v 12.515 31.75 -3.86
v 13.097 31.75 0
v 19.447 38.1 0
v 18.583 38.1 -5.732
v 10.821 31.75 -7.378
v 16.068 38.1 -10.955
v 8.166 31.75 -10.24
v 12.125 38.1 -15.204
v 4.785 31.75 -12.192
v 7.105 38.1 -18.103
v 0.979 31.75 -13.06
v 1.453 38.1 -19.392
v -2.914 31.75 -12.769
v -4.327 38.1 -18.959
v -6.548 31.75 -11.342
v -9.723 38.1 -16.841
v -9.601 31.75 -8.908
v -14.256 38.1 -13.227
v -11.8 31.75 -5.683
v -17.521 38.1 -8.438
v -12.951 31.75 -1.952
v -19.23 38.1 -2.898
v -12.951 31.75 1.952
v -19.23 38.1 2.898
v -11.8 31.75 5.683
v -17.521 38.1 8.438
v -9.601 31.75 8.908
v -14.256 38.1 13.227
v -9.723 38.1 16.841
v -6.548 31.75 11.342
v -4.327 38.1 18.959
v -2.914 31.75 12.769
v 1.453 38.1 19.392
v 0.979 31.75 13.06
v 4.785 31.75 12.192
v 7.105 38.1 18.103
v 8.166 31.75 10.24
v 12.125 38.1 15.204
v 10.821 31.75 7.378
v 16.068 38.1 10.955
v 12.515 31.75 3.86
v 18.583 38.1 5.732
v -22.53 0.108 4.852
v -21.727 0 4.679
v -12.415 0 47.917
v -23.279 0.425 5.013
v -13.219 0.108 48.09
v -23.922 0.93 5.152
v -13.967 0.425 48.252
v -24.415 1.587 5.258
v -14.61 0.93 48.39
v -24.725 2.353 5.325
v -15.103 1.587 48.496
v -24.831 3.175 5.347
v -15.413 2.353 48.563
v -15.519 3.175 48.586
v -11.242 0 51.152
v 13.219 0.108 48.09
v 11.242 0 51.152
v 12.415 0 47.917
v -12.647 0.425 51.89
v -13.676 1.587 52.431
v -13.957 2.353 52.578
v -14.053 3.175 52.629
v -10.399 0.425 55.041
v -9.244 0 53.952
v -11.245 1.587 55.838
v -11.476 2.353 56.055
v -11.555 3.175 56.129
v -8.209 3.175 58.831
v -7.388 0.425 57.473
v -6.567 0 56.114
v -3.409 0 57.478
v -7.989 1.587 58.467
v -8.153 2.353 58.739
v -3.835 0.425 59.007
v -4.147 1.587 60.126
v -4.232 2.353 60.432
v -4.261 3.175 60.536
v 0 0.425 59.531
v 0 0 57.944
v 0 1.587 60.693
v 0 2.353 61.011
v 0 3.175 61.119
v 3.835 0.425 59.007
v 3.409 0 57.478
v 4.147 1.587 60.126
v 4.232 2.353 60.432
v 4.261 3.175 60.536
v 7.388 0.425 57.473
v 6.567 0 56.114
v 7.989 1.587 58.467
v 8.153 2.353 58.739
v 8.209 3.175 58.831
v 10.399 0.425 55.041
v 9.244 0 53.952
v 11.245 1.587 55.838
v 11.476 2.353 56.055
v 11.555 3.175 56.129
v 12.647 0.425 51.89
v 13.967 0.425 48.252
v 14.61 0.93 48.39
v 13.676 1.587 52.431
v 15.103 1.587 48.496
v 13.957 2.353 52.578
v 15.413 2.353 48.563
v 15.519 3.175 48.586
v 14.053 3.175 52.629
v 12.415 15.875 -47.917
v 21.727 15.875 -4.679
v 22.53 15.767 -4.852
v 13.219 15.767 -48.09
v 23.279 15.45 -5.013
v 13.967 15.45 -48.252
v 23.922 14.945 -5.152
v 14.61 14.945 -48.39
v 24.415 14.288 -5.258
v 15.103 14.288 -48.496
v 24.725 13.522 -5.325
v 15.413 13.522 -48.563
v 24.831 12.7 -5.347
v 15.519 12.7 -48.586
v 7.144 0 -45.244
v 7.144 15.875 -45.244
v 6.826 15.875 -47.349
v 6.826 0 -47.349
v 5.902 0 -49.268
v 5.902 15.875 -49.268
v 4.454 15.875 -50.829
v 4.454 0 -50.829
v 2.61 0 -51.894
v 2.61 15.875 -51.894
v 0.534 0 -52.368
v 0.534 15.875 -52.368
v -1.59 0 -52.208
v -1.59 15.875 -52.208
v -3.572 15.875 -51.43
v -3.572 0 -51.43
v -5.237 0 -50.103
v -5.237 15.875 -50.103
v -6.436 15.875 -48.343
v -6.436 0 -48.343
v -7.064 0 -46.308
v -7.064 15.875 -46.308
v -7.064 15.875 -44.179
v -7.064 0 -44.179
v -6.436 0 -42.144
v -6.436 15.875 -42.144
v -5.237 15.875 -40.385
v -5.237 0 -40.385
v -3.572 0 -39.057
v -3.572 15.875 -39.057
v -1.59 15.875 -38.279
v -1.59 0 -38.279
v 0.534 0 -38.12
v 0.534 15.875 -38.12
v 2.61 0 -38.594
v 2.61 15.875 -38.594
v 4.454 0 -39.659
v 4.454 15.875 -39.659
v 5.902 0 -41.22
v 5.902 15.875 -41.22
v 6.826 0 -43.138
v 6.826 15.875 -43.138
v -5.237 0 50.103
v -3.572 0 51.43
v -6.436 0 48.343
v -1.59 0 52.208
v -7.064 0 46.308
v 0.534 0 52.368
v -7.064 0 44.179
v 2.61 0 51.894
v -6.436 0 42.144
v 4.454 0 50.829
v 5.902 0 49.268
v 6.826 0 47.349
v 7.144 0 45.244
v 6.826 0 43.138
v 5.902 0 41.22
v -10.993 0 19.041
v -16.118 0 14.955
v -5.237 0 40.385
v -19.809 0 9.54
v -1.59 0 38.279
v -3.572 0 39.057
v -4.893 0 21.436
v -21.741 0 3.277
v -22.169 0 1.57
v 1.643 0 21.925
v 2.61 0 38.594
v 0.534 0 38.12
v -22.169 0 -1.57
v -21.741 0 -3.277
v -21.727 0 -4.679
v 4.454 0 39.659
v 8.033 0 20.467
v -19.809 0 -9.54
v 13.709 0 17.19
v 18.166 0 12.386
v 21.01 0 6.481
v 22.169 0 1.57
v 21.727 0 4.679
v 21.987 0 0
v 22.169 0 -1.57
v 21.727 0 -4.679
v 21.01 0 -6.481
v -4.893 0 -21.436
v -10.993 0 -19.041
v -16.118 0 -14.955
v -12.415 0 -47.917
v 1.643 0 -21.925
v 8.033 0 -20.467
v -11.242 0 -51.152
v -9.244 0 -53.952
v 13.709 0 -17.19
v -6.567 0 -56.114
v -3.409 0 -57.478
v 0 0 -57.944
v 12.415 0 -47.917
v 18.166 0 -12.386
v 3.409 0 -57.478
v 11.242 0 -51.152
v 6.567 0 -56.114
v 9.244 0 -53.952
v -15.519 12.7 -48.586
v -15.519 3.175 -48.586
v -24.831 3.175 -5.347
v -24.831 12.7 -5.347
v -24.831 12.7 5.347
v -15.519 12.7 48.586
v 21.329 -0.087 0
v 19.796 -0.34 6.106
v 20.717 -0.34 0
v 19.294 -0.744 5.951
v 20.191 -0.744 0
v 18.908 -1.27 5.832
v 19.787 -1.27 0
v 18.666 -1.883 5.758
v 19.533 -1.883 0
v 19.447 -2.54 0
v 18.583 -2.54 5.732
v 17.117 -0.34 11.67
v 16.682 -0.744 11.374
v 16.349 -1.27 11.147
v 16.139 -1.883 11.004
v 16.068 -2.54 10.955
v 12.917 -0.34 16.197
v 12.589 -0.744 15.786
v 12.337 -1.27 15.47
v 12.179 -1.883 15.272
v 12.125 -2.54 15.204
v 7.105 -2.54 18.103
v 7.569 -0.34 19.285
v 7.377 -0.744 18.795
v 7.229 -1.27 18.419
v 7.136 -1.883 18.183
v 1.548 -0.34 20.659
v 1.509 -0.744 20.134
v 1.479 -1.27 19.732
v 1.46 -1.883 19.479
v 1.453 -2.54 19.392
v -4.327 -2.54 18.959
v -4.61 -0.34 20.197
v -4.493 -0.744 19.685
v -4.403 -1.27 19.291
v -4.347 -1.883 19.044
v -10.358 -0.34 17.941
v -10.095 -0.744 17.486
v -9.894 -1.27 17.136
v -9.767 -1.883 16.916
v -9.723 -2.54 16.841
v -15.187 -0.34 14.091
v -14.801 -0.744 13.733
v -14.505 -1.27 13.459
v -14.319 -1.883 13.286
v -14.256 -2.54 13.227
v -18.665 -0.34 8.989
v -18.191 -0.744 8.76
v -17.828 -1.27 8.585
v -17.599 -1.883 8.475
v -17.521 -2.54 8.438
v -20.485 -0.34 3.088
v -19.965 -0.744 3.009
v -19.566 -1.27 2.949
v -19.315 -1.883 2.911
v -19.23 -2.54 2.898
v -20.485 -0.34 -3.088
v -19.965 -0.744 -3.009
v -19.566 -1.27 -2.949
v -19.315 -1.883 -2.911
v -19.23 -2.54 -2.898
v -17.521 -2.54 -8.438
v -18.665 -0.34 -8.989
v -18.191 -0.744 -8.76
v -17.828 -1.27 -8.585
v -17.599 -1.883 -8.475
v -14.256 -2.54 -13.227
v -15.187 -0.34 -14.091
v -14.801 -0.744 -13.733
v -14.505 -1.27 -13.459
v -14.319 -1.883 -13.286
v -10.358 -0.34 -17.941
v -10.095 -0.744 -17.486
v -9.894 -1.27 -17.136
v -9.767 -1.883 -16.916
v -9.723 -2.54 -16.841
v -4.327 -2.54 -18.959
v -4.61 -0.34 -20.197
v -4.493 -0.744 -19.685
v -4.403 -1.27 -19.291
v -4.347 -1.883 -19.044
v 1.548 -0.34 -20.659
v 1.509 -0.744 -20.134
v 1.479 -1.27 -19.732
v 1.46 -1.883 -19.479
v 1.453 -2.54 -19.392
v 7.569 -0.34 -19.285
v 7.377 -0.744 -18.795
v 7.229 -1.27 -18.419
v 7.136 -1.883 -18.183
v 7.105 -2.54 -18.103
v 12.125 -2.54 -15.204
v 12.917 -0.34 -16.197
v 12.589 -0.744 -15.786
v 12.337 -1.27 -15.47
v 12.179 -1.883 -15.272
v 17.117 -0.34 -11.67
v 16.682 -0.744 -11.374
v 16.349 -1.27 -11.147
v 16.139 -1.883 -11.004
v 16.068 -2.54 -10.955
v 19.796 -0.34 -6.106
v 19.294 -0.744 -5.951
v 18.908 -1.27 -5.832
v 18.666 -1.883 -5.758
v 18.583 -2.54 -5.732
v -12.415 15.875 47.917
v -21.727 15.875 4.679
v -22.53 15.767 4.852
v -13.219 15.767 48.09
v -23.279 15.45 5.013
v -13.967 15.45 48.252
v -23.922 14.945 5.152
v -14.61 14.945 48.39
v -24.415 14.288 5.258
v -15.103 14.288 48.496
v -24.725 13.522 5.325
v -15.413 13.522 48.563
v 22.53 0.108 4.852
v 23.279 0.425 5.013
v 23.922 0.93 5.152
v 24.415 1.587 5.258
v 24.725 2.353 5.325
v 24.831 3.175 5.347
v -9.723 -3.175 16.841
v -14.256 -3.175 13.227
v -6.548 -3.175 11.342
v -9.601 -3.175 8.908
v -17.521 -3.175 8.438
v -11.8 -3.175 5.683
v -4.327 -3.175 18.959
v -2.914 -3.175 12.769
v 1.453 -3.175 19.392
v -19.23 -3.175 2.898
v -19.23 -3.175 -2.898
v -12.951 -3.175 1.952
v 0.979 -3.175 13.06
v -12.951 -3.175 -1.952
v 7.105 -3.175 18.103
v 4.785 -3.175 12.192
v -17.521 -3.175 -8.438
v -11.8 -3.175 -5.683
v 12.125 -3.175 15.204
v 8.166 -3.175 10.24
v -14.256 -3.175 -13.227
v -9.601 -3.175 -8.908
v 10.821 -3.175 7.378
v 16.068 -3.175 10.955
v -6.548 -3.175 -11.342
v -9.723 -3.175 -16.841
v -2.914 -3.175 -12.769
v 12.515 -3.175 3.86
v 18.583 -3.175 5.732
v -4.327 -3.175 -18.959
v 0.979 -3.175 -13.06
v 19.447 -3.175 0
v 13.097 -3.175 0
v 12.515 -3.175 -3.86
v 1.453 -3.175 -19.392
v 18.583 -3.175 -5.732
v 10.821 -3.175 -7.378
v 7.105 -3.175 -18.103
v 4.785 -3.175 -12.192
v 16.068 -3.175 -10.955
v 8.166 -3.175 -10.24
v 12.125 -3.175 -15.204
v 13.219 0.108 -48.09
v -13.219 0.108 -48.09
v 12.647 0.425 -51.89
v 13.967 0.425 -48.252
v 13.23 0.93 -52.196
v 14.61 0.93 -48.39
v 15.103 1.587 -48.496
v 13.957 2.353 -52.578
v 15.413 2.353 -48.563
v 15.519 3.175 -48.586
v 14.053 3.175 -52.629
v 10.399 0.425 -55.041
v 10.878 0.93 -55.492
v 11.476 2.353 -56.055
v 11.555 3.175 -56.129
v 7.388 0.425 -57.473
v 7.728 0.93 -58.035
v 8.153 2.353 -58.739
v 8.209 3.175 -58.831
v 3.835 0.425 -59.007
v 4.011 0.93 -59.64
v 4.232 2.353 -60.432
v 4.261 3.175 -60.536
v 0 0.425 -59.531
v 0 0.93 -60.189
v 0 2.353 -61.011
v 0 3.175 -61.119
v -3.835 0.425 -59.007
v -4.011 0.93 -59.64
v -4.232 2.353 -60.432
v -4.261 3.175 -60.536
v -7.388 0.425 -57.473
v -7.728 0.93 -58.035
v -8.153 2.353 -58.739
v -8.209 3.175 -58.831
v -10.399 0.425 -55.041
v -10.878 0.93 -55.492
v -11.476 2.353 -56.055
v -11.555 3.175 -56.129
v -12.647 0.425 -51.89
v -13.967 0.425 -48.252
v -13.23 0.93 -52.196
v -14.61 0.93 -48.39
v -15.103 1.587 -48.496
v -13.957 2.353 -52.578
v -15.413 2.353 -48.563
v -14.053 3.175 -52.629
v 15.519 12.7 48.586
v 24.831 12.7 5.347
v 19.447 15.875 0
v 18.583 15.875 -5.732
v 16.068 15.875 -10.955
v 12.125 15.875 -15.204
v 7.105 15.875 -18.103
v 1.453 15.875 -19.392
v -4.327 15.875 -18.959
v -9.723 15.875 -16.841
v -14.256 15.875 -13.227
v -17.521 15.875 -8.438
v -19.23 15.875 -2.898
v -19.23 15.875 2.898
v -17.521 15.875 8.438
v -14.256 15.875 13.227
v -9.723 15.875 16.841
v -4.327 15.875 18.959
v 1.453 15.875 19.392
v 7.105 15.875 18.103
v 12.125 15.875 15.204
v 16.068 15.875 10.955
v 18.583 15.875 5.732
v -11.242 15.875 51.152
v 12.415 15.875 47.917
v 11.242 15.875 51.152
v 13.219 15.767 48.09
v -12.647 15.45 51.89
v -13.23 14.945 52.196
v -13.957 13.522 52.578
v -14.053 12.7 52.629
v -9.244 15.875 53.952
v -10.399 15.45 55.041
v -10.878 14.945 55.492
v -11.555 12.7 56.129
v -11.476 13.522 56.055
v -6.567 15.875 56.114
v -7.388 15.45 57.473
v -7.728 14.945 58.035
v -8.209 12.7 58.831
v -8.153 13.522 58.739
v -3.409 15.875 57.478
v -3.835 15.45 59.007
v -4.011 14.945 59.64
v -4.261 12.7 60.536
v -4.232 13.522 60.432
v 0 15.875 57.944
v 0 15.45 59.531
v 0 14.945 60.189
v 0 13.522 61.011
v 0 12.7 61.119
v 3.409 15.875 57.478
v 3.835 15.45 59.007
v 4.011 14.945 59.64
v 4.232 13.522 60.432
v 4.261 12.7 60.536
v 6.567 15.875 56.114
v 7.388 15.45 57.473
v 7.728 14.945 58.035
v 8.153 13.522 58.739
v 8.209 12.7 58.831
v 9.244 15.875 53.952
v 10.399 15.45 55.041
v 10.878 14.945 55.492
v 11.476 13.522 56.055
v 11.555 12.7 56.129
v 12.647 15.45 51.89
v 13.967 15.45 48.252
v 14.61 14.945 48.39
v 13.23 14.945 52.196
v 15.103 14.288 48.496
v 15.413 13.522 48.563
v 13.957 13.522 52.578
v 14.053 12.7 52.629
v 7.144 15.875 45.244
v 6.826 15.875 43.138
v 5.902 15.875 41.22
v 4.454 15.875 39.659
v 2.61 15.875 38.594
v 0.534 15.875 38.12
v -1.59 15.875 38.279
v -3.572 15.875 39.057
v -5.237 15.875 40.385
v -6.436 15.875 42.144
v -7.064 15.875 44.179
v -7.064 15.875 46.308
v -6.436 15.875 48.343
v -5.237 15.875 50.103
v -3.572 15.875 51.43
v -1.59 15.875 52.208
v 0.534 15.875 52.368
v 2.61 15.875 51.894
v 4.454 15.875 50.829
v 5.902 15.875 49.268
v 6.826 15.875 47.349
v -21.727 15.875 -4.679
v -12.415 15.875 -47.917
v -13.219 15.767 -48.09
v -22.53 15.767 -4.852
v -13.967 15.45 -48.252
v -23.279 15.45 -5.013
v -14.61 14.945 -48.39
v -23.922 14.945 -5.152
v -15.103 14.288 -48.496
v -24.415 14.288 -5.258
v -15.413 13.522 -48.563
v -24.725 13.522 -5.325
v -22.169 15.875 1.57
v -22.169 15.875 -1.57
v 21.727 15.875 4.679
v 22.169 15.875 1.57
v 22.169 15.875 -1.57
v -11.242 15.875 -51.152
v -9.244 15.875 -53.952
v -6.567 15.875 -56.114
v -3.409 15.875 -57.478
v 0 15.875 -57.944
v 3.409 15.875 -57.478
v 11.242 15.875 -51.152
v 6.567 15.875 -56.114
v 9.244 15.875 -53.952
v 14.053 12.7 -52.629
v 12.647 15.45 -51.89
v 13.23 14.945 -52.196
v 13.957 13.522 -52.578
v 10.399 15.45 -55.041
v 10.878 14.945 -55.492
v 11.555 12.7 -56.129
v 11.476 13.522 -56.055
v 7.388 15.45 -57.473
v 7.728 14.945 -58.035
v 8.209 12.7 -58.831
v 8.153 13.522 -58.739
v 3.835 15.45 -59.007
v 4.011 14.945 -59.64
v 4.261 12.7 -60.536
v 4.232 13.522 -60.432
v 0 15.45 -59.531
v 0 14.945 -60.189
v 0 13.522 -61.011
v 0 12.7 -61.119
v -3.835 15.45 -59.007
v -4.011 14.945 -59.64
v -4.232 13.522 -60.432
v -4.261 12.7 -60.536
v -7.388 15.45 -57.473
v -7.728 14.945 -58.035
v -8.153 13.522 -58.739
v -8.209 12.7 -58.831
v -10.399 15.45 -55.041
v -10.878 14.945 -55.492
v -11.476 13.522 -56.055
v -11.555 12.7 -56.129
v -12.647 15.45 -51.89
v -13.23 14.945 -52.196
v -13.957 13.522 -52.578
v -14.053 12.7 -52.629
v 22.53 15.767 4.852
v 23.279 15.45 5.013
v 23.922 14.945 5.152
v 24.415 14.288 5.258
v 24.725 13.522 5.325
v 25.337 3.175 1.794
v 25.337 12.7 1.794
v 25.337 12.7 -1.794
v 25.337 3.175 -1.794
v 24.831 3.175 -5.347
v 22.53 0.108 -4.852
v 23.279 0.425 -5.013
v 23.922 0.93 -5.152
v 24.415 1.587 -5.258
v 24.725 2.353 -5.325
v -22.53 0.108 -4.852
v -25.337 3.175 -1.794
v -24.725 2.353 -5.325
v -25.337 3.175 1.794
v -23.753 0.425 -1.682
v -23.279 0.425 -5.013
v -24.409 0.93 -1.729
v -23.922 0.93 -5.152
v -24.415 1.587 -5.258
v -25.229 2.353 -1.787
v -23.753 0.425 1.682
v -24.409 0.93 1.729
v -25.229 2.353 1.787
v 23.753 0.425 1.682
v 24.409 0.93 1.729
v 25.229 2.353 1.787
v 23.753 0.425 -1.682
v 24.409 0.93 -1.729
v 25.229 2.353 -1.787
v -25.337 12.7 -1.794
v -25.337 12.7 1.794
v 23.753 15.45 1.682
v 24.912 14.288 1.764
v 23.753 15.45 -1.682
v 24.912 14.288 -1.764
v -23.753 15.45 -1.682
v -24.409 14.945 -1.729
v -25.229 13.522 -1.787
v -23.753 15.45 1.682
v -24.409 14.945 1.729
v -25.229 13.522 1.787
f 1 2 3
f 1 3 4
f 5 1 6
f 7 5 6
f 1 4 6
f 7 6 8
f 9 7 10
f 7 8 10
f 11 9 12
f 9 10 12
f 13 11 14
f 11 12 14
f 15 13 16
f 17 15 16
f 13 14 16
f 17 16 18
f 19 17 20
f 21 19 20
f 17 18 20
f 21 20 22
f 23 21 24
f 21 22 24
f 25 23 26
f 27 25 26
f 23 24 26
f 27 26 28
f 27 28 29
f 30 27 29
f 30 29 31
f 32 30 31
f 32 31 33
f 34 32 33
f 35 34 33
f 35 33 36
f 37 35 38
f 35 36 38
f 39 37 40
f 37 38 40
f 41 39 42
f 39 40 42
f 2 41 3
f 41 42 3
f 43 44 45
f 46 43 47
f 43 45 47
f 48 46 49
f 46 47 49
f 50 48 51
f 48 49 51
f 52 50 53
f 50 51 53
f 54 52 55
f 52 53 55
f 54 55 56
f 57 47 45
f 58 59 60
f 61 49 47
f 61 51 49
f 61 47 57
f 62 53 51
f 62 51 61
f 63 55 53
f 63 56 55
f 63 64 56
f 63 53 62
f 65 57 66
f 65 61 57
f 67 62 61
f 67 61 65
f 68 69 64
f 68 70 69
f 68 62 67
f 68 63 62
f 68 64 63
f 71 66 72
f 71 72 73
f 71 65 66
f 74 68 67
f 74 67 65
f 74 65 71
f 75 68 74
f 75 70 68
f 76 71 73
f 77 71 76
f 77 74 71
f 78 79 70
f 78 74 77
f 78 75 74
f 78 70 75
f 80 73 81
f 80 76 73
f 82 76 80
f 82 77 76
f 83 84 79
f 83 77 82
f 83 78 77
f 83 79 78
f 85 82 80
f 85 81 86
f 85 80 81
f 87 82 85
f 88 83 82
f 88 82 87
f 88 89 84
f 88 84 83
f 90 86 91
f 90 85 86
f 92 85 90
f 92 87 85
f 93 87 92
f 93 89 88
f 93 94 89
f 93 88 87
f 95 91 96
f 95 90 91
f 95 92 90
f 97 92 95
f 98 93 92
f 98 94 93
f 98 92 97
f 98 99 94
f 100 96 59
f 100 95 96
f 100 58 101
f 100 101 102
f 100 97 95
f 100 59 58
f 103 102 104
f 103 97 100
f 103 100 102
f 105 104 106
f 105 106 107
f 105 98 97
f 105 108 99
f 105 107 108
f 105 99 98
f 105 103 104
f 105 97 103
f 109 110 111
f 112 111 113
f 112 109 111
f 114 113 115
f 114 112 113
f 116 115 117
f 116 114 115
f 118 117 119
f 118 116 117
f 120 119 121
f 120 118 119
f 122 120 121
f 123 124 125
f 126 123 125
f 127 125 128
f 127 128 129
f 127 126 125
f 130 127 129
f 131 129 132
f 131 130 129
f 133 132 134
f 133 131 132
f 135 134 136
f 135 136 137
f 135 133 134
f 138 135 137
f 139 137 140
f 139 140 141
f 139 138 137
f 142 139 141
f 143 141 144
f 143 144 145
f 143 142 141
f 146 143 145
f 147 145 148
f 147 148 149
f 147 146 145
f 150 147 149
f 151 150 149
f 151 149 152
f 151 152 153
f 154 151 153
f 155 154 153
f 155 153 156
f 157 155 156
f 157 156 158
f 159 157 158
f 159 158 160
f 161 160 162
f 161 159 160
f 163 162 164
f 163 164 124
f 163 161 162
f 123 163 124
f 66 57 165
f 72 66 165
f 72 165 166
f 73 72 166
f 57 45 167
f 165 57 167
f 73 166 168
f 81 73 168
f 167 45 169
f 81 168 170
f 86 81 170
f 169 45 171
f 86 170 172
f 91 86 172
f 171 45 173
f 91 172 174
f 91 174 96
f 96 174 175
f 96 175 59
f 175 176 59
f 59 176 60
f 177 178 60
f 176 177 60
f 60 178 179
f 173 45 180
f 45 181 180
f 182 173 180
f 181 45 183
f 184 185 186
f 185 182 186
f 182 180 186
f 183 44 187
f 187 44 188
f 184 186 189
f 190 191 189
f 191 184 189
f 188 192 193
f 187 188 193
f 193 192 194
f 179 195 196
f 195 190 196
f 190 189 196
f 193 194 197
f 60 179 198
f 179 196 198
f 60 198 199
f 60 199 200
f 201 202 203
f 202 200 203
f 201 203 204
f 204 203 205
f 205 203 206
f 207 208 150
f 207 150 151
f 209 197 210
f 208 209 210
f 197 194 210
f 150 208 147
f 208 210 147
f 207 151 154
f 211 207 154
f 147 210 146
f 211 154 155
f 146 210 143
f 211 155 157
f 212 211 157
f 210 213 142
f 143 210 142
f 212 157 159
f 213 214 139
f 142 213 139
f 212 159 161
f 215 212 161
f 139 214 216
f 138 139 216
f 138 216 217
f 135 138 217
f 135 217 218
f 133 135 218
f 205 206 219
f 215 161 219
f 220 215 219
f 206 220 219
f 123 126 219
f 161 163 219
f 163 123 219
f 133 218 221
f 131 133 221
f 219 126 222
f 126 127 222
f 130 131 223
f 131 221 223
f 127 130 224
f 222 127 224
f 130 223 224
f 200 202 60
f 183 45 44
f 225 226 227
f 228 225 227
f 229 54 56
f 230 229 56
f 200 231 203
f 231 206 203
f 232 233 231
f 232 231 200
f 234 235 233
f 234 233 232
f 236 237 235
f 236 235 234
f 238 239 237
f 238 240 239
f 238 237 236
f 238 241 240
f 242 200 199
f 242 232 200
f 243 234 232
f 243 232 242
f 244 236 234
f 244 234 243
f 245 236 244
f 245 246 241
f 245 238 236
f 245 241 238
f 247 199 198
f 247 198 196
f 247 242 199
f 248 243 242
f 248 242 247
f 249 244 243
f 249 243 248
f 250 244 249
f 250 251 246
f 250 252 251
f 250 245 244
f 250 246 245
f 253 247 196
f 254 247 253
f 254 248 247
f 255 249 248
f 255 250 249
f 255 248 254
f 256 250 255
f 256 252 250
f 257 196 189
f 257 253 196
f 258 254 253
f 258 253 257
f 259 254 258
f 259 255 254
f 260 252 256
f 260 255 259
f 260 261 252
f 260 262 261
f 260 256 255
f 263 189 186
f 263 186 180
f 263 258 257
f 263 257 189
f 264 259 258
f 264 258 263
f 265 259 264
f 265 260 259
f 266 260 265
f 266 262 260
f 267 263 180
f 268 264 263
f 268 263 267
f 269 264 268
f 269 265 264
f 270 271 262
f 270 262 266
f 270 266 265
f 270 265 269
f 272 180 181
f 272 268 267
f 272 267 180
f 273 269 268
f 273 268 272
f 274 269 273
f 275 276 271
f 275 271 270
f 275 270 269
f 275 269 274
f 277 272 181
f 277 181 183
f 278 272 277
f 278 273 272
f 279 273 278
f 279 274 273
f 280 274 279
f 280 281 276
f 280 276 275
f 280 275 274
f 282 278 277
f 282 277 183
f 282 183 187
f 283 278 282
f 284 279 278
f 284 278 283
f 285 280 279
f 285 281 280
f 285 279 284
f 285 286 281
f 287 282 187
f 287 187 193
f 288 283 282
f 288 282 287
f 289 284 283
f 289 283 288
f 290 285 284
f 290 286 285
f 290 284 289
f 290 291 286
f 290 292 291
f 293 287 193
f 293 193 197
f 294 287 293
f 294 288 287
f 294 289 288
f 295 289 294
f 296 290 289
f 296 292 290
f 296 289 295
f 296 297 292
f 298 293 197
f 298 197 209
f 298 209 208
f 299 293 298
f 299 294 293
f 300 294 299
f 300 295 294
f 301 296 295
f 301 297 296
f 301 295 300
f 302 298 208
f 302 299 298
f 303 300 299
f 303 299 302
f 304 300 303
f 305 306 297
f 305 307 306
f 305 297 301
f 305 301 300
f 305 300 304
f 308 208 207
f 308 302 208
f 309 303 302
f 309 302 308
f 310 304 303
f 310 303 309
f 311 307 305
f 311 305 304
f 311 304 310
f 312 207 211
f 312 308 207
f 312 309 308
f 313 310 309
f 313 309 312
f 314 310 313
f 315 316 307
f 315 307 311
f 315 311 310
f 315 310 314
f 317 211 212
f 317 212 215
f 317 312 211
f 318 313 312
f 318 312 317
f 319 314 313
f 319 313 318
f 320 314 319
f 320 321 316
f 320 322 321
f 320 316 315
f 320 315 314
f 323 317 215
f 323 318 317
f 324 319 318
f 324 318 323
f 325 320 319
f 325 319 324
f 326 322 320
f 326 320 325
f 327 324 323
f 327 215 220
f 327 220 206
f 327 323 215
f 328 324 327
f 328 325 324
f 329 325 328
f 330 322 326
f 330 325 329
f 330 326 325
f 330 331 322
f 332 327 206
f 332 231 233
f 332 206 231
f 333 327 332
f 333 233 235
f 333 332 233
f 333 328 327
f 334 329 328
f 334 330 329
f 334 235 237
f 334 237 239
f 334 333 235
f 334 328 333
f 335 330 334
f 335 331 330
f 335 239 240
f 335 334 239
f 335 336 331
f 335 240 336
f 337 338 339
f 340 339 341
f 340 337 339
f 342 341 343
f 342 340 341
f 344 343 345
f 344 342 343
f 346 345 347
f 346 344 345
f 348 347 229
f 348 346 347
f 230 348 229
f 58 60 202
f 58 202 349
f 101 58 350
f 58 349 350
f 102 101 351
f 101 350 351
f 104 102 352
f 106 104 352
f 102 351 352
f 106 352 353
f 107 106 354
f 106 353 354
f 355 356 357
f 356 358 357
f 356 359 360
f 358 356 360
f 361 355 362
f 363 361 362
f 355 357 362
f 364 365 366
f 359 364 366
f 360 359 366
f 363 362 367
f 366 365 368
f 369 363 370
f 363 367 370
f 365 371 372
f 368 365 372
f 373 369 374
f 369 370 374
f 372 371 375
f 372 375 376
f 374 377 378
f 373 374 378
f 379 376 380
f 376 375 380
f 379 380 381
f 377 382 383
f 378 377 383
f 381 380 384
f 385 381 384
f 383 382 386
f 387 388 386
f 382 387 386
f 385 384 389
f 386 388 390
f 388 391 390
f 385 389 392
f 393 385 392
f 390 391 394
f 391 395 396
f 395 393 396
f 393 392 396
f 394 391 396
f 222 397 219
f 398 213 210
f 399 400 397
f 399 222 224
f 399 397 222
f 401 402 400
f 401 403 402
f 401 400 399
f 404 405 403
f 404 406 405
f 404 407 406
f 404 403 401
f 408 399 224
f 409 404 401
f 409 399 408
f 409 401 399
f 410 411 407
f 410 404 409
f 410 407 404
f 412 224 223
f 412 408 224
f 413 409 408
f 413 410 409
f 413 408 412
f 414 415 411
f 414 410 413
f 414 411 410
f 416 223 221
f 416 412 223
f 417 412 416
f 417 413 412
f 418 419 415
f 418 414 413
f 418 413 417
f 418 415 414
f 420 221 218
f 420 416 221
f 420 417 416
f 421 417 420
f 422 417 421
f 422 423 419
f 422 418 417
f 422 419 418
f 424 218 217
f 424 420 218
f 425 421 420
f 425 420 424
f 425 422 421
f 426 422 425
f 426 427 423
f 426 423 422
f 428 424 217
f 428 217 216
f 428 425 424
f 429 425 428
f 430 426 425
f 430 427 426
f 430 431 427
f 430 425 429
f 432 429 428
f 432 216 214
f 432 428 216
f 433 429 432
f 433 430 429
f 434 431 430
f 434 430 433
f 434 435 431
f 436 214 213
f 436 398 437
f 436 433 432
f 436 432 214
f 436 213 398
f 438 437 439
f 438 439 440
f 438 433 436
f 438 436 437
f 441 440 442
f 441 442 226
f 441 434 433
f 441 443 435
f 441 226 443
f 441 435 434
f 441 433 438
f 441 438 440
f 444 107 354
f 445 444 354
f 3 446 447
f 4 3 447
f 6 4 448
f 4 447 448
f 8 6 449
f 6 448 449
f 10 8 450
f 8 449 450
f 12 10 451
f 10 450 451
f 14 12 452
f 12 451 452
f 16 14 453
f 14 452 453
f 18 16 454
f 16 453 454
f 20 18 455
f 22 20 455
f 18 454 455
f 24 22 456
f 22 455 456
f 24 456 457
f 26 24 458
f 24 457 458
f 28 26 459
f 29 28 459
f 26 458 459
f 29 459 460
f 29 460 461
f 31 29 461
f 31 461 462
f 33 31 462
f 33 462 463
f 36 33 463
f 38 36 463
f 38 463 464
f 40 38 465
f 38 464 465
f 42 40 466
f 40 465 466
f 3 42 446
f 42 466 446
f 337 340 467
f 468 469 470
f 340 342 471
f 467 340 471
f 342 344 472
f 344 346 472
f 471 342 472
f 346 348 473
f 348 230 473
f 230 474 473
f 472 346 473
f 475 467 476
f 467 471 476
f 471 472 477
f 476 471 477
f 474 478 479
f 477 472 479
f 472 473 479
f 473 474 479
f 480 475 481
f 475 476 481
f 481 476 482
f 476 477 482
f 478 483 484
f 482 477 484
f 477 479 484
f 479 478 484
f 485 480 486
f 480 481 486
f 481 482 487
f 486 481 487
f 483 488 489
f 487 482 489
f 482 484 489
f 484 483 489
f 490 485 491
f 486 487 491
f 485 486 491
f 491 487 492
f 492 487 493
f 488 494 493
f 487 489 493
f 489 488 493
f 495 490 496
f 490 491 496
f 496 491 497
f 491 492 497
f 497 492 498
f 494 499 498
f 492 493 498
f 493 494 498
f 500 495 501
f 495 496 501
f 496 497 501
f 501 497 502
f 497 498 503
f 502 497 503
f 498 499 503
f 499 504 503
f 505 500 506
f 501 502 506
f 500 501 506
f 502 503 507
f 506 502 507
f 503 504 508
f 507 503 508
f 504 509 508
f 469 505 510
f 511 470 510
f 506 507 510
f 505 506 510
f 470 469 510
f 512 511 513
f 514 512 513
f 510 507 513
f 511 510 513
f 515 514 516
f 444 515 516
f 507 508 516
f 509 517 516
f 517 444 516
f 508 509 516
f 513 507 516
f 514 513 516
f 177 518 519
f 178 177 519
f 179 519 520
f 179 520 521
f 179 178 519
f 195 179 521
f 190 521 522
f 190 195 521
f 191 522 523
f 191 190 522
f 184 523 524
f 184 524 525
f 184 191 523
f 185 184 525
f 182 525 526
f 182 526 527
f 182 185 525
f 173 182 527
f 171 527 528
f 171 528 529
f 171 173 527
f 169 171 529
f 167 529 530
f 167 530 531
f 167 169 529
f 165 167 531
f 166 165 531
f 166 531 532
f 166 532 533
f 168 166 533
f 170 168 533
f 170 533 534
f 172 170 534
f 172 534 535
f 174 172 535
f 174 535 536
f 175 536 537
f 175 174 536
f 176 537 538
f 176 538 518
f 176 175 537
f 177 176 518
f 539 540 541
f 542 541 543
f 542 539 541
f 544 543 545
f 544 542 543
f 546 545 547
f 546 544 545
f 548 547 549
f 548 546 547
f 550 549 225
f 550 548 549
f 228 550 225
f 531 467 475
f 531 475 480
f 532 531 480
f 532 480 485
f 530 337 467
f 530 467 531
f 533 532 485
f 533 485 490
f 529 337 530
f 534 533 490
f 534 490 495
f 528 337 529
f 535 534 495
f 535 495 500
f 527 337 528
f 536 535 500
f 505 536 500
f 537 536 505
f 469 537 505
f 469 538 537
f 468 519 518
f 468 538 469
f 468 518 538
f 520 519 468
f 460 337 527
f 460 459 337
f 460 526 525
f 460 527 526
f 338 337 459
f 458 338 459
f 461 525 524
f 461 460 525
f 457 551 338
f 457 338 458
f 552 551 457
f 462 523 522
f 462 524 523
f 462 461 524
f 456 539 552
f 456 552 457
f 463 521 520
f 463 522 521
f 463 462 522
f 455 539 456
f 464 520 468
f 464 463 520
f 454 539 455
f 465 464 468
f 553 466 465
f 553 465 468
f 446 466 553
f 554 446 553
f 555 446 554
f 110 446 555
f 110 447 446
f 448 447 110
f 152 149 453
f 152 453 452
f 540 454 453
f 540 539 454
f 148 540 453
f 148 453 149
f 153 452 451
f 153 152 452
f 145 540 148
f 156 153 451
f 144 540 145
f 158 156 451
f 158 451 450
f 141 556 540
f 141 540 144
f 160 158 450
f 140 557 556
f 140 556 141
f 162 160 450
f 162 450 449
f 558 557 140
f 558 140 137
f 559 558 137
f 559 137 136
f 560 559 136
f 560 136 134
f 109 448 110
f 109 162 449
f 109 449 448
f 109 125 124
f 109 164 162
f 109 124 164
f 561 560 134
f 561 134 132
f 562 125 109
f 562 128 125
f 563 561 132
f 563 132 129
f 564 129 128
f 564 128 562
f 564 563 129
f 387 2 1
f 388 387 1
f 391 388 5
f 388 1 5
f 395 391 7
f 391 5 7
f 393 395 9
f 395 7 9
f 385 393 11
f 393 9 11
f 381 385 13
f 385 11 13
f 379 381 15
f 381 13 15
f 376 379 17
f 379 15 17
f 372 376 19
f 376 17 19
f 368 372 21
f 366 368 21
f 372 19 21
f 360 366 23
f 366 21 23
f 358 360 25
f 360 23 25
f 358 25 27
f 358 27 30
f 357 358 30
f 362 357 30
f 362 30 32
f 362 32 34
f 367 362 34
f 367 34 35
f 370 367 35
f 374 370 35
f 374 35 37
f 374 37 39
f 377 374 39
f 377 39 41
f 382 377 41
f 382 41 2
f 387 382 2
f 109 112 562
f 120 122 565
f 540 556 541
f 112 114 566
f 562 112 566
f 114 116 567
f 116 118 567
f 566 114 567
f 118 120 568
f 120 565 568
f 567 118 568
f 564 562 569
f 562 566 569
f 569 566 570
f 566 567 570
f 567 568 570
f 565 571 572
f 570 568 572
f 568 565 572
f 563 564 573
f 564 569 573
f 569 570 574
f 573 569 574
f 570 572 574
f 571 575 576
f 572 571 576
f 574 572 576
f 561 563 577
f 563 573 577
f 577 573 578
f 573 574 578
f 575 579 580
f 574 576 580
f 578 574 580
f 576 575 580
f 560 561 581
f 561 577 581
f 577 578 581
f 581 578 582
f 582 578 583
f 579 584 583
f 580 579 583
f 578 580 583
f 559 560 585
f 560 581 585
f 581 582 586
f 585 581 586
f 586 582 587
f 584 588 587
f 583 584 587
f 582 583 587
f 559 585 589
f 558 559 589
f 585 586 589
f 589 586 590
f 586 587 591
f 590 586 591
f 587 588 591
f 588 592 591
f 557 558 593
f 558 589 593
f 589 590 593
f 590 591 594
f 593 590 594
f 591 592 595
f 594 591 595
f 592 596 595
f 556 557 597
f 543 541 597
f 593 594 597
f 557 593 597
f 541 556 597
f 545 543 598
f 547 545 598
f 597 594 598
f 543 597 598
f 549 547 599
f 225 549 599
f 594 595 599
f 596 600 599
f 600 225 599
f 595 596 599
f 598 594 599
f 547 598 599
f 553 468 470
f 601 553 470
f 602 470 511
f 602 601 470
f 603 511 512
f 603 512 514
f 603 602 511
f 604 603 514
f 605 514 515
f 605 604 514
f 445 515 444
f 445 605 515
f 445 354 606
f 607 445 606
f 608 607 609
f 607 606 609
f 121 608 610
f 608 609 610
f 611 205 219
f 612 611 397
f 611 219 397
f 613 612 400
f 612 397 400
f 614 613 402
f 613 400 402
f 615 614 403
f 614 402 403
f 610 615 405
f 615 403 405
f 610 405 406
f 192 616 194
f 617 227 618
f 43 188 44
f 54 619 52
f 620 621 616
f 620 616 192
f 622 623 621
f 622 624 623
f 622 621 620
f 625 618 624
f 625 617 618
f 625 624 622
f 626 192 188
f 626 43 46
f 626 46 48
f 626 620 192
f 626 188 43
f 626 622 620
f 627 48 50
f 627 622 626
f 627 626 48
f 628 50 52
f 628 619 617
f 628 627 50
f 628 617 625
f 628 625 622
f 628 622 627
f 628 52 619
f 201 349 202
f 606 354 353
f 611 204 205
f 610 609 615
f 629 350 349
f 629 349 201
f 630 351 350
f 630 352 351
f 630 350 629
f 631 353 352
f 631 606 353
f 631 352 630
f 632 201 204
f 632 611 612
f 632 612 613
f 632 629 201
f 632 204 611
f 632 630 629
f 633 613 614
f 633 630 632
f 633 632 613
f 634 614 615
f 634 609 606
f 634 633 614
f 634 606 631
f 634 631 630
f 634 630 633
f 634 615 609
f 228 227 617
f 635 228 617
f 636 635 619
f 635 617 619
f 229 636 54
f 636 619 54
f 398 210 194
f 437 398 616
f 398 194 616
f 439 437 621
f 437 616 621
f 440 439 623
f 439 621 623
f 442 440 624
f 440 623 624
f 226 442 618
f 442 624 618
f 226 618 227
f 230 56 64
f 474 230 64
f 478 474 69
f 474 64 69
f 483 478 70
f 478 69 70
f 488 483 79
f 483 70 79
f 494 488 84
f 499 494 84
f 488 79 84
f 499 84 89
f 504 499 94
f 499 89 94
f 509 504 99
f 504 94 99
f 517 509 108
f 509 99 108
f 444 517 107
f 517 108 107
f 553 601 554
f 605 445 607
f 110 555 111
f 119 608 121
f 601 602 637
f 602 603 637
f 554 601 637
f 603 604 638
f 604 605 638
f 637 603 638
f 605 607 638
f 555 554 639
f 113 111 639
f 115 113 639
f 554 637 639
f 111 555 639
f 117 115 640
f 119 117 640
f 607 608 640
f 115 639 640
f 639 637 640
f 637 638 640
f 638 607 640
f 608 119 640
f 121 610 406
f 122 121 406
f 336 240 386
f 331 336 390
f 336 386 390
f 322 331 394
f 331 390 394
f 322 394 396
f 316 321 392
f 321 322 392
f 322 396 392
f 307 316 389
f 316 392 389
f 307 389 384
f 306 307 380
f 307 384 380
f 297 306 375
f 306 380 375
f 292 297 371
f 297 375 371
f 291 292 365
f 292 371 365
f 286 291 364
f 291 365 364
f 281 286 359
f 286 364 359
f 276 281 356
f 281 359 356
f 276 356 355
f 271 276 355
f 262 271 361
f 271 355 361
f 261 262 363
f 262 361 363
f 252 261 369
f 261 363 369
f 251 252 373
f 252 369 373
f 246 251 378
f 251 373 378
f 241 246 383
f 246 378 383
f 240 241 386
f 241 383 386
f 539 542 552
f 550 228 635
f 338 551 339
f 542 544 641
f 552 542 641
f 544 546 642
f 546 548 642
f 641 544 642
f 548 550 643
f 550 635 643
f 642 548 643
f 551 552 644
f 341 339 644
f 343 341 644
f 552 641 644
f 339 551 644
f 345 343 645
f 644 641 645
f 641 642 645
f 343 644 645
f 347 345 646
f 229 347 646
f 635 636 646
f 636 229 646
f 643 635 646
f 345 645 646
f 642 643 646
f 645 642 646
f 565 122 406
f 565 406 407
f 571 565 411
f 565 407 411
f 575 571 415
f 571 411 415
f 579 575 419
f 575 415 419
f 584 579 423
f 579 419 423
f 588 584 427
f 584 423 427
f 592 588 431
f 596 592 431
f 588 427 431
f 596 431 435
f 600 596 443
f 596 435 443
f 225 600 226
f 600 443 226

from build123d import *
from OCP.BRepFilletAPI import BRepFilletAPI_MakeFillet

# Parameters (mm, degrees)
SKETCH1_R           = 13.096875
SKETCH1_R_2         = 7.14375
BOSS_EXTRUDE1_DEPTH = 15.875
FILLET3_R1          = 3.175
FILLET3_R2          = 2.54


with BuildPart() as part:
    # Sketch1 → Boss-Extrude1 (new body)
    with BuildSketch(Plane(origin=(0, 0, 0), x_dir=(1, 0, 0), z_dir=(0, 1, 0))):
        with BuildLine():
            Line((24.830740041, 5.347368421), (15.519212525, 48.585855263))
            ThreePointArc((15.519212525, 48.585855263), (0, 61.11875), (-15.519212525, 48.585855263))
            Line((-15.519212525, 48.585855263), (-24.830740041, 5.347368421))
            ThreePointArc((-24.830740041, 5.347368421), (-25.4, 0), (-24.830740041, -5.347368421))
            Line((-24.830740041, -5.347368421), (-15.519212525, -48.585855263))
            ThreePointArc((-15.519212525, -48.585855263), (0, -61.11875), (15.519212525, -48.585855263))
            Line((15.519212525, -48.585855263), (24.830740041, -5.347368421))
            ThreePointArc((24.830740041, -5.347368421), (25.4, 0), (24.830740041, 5.347368421))
        make_face()
        Circle(SKETCH1_R, mode=Mode.SUBTRACT)
        with Locations((0, 45.24375)):
            Circle(SKETCH1_R_2, mode=Mode.SUBTRACT)
        with Locations((0, -45.24375)):
            Circle(SKETCH1_R_2, mode=Mode.SUBTRACT)
    extrude(amount=BOSS_EXTRUDE1_DEPTH)

    # Sketch2 → Revolve1 (revolve)
    with BuildSketch(Plane.XY):
        Polygon((13.096875, 31.75), (19.446875, 38.1), (19.446875, -3.175), (13.096875, -3.175), align=None)
    revolve(axis=Axis((0, -3.175, 0), (0, 1, 0)))

    # Fillet3: one fillet with a radius per group of edges: ONE call of the kernel's fillet builder (fillet() takes one radius for all edges)
    fillet3_edges_1 = [part.edges().sort_by_distance(p)[0] for p in [
        (20.174976283, 0, 26.966611842),
        (25.4, 15.875, 0),
    ]]
    fillet3_edges_2 = [part.edges().sort_by_distance(p)[0] for p in [
        (-19.446875, 0, 0),
    ]]
    fillet3 = BRepFilletAPI_MakeFillet(part.part.solid().wrapped)
    for e in fillet3_edges_1:
        fillet3.Add(FILLET3_R1, e.wrapped)
    for e in fillet3_edges_2:
        fillet3.Add(FILLET3_R2, e.wrapped)
    add(Compound.cast(fillet3.Shape()), mode=Mode.REPLACE)


solid = part.part
